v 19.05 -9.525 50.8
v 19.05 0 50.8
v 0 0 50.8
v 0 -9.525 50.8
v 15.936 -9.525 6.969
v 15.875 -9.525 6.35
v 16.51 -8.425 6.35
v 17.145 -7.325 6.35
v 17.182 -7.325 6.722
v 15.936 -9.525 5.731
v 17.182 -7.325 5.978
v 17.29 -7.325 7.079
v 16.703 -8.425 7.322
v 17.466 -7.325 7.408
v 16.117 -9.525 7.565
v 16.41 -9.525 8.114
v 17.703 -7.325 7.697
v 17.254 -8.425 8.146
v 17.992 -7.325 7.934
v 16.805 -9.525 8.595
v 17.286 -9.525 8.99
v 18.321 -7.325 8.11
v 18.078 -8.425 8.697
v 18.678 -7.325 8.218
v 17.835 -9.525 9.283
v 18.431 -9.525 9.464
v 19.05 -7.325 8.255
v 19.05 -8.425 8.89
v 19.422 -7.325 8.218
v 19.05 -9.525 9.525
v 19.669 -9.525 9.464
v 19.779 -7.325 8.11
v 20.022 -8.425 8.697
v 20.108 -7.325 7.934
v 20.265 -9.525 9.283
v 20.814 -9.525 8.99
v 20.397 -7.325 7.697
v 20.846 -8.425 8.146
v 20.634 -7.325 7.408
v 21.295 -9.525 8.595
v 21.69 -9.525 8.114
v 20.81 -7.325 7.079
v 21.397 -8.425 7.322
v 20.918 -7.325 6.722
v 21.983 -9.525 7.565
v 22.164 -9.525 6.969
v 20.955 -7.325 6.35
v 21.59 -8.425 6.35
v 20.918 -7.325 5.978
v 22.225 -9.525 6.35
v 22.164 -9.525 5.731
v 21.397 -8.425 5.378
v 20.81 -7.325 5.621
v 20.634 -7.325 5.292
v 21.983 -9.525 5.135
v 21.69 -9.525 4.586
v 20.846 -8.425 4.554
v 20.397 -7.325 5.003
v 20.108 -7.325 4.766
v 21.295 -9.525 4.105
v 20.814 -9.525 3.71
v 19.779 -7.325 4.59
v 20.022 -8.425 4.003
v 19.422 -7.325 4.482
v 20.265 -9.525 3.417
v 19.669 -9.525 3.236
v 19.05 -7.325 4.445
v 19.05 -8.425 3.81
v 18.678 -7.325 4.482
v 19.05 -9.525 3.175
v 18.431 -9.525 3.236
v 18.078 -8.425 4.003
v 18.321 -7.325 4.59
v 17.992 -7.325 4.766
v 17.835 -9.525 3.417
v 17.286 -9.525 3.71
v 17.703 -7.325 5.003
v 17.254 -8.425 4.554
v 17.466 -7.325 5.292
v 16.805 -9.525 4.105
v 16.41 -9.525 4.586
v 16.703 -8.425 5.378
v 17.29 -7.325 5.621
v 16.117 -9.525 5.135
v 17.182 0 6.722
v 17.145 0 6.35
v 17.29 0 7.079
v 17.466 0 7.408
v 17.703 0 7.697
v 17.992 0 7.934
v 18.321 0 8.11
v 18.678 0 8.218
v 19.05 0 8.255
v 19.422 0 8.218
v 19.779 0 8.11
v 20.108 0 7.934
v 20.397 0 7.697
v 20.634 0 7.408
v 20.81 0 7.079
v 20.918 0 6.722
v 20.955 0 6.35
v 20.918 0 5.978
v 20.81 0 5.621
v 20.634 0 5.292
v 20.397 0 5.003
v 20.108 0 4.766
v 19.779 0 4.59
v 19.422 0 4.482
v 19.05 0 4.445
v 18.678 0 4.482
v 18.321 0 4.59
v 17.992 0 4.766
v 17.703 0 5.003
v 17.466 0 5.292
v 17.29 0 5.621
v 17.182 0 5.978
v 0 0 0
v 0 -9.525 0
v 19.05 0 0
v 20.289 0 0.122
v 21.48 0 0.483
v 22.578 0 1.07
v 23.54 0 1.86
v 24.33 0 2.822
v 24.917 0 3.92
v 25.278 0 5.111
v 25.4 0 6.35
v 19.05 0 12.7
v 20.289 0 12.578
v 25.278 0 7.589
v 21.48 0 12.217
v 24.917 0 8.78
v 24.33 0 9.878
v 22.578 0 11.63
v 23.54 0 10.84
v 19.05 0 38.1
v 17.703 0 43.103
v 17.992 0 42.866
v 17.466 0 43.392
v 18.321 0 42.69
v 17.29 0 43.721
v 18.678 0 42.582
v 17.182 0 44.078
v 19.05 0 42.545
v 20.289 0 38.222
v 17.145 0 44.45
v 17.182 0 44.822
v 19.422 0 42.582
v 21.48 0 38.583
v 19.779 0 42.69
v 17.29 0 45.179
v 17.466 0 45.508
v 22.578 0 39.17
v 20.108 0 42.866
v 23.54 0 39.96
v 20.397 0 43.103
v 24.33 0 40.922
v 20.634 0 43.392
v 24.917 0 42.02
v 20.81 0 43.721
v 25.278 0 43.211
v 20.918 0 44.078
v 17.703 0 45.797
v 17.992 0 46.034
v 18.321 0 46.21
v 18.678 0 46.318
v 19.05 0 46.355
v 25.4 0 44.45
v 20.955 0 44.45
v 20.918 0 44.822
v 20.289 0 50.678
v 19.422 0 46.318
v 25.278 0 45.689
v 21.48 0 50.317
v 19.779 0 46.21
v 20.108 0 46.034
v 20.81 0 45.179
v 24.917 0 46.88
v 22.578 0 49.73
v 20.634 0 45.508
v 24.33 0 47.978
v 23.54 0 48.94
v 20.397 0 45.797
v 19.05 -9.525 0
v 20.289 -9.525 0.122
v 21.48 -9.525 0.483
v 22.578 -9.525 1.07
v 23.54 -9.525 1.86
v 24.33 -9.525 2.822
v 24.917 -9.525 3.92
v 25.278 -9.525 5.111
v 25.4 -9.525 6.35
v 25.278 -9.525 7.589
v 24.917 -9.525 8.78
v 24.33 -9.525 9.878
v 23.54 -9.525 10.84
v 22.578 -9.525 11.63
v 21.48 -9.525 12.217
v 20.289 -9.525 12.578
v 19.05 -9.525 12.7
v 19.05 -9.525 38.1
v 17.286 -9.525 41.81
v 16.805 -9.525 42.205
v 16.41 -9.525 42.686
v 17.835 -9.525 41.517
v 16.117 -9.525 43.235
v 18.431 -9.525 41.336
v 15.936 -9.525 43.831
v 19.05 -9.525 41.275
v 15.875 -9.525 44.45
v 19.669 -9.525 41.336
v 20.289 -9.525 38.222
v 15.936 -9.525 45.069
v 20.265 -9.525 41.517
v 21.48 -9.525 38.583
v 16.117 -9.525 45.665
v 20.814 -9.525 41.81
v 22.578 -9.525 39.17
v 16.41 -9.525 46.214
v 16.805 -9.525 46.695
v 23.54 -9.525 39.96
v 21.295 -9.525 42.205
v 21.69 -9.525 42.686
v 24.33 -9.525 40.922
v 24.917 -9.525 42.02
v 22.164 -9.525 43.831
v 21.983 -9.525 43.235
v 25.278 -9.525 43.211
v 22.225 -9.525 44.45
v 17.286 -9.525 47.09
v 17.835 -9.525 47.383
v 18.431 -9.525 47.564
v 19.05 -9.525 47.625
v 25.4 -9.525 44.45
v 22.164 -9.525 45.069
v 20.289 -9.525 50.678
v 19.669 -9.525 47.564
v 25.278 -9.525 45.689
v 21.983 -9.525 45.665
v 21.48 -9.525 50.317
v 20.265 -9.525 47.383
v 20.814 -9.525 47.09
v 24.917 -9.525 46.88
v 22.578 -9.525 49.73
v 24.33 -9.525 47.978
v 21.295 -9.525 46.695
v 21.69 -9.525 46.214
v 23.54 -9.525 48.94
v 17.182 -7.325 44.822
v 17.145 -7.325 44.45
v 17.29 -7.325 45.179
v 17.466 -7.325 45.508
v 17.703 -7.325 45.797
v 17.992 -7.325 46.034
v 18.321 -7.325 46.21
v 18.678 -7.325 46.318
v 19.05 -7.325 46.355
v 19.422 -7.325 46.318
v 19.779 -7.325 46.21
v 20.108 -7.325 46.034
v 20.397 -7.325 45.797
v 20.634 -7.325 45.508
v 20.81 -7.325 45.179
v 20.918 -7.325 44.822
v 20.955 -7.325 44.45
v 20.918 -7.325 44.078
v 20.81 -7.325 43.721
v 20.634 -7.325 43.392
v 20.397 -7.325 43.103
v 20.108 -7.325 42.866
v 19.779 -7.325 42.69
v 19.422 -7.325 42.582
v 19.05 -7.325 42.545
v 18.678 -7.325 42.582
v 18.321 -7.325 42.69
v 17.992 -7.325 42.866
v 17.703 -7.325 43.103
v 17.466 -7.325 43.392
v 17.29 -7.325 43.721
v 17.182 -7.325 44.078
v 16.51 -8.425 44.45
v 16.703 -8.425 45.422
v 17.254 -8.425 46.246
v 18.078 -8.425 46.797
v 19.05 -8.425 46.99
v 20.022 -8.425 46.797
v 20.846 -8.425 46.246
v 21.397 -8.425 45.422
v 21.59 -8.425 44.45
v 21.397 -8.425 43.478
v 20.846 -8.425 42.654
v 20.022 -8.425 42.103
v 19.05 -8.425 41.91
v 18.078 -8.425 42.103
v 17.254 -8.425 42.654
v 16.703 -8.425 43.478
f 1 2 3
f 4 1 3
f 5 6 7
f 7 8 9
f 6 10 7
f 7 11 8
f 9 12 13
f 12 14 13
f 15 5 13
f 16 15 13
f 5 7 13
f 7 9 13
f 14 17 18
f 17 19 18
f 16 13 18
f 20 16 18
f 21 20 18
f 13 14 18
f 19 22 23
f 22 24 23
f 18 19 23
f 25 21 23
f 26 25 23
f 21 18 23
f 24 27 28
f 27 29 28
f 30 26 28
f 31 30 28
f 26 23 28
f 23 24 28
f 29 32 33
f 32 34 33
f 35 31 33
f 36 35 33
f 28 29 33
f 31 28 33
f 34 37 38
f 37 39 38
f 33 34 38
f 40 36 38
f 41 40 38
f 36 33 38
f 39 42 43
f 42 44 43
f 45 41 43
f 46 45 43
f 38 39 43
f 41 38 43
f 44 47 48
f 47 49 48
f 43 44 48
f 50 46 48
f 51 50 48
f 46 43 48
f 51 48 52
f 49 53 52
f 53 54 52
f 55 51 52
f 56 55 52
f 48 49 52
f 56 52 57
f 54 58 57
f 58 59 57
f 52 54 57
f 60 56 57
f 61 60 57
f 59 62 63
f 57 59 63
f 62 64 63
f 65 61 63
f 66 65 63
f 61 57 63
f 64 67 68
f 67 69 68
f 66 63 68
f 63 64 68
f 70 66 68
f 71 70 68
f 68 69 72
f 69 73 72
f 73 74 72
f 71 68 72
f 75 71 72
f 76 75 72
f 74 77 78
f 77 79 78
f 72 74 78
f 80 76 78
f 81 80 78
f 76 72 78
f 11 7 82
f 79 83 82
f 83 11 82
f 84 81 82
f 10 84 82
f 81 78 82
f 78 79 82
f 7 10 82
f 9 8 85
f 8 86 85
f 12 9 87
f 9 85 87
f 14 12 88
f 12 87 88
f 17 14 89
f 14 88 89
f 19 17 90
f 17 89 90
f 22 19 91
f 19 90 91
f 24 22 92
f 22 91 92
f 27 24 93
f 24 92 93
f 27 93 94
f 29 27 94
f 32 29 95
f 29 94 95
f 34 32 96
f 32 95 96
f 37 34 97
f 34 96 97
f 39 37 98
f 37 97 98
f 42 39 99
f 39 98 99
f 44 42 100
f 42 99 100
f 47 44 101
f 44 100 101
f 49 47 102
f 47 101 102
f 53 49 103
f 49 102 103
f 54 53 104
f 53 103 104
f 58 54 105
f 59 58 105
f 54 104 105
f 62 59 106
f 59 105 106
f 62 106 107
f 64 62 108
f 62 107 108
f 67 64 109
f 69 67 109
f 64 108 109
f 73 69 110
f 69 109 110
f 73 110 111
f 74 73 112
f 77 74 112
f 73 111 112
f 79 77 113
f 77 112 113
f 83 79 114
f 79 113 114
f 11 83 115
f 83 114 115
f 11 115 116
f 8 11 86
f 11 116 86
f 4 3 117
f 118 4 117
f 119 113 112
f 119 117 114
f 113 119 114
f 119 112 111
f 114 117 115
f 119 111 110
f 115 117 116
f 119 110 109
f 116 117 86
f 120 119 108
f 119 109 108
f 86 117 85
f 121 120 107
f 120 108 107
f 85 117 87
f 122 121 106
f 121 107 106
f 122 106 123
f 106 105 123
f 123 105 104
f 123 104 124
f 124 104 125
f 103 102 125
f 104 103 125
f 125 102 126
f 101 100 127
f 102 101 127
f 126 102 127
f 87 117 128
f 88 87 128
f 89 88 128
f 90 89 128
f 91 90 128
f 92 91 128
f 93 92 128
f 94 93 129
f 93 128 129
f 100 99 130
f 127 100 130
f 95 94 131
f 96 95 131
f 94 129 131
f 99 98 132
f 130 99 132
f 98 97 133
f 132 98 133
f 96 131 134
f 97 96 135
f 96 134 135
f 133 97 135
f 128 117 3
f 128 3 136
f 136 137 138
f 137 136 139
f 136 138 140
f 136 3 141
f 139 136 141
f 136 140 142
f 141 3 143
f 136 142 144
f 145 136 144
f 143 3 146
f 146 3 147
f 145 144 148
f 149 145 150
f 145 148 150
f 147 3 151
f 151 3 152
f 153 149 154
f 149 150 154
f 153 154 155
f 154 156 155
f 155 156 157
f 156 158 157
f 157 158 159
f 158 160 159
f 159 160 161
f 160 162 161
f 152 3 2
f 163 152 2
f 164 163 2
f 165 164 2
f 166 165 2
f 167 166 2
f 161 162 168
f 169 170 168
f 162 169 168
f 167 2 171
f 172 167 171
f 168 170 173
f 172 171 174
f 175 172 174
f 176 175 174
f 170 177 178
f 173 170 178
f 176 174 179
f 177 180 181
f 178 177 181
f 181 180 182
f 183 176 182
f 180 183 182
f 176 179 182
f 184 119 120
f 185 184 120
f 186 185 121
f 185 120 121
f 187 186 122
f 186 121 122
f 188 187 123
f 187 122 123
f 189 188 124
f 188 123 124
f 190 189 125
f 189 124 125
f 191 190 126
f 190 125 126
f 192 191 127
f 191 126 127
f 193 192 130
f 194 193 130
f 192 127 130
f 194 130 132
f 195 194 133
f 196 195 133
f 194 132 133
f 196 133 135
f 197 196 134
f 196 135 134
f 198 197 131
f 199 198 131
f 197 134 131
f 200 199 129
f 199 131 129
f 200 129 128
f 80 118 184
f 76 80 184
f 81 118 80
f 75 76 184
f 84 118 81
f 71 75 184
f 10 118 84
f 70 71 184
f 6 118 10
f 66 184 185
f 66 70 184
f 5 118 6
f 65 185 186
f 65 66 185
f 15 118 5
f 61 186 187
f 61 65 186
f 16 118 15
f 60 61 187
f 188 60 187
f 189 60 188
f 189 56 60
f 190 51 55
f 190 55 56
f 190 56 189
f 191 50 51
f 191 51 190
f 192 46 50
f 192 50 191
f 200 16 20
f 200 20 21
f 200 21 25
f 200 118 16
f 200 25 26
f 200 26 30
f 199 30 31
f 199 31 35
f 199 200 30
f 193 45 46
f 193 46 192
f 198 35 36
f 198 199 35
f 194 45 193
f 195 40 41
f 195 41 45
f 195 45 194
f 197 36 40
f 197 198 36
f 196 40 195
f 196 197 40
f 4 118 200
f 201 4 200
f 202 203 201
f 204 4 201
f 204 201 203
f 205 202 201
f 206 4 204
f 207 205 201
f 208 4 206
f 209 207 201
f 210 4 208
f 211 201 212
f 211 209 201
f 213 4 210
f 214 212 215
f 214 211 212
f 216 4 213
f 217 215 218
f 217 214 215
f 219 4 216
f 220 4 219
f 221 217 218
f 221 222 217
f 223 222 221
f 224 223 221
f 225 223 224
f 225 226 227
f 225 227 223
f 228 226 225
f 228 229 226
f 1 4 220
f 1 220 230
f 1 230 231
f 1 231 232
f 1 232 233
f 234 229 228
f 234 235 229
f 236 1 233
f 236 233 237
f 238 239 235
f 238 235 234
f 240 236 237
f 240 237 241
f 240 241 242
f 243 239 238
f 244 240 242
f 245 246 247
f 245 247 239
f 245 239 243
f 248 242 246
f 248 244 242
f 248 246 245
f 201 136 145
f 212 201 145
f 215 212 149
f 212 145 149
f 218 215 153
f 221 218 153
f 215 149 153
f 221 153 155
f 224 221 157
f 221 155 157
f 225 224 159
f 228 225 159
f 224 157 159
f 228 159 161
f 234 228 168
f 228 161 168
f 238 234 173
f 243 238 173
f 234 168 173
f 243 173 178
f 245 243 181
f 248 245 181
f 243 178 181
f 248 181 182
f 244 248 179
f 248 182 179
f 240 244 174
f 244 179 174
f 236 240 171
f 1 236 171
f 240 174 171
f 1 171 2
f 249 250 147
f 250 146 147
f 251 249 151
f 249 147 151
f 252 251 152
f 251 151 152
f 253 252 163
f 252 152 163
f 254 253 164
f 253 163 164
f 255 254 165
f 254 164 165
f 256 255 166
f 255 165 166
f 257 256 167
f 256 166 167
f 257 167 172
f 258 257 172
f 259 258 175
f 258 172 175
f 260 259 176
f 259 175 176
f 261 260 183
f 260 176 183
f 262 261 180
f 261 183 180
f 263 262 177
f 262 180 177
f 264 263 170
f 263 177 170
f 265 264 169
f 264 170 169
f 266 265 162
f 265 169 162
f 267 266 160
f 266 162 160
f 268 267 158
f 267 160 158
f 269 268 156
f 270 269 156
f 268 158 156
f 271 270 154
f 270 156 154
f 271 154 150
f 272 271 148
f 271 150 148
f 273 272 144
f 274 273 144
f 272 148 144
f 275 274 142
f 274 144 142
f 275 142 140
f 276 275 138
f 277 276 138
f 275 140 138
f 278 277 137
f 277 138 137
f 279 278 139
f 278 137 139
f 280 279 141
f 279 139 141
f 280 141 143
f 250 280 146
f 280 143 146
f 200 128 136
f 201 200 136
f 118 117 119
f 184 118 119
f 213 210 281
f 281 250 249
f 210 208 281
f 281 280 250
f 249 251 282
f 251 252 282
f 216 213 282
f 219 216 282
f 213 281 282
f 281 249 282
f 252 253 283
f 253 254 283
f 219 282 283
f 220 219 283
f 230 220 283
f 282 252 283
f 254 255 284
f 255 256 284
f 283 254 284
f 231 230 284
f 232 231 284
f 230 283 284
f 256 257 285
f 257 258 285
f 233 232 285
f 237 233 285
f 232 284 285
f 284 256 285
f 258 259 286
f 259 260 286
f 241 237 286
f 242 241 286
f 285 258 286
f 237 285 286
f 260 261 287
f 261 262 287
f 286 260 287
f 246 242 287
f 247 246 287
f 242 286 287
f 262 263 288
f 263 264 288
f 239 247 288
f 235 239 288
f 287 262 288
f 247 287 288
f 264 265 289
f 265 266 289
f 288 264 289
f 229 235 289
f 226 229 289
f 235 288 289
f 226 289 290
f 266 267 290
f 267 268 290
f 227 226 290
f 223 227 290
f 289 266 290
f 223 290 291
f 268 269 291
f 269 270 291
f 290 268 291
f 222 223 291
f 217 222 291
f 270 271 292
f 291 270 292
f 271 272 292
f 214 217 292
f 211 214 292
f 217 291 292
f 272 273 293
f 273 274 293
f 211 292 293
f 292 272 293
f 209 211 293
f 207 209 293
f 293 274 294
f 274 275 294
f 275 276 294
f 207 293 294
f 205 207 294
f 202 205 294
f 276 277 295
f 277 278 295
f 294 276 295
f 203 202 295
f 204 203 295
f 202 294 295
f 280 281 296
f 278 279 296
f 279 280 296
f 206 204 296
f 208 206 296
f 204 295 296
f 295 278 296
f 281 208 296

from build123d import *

# Parameters (mm, degrees)
F1_DEPTH       = 9.525
F3_D           = 3.81
F3_CSINK_D     = 6.35
F3_CSINK_ANGLE = 60


with BuildPart() as f1:
    # F0 (on Front) → F1 (new body)
    with BuildSketch(Plane.XZ):
        with BuildLine():
            Line((0, 50.8), (0, 0))
            Line((0, 0), (19.05, 0))
            ThreePointArc((19.05, 0), (25.4, 6.35), (19.05, 12.7))
            Line((19.05, 12.7), (19.05, 38.1))
            ThreePointArc((19.05, 38.1), (25.4, 44.45), (19.05, 50.8))
            Line((19.05, 50.8), (0, 50.8))
        make_face()
    extrude(amount=F1_DEPTH)

    # F3 (through all)
    with Locations(Plane.XZ.offset(9.525)):
        with Locations((19.05, 44.45), (19.05, 6.35)):
            CounterSinkHole(F3_D / 2, F3_CSINK_D / 2, counter_sink_angle=F3_CSINK_ANGLE)


solid = f1.part
